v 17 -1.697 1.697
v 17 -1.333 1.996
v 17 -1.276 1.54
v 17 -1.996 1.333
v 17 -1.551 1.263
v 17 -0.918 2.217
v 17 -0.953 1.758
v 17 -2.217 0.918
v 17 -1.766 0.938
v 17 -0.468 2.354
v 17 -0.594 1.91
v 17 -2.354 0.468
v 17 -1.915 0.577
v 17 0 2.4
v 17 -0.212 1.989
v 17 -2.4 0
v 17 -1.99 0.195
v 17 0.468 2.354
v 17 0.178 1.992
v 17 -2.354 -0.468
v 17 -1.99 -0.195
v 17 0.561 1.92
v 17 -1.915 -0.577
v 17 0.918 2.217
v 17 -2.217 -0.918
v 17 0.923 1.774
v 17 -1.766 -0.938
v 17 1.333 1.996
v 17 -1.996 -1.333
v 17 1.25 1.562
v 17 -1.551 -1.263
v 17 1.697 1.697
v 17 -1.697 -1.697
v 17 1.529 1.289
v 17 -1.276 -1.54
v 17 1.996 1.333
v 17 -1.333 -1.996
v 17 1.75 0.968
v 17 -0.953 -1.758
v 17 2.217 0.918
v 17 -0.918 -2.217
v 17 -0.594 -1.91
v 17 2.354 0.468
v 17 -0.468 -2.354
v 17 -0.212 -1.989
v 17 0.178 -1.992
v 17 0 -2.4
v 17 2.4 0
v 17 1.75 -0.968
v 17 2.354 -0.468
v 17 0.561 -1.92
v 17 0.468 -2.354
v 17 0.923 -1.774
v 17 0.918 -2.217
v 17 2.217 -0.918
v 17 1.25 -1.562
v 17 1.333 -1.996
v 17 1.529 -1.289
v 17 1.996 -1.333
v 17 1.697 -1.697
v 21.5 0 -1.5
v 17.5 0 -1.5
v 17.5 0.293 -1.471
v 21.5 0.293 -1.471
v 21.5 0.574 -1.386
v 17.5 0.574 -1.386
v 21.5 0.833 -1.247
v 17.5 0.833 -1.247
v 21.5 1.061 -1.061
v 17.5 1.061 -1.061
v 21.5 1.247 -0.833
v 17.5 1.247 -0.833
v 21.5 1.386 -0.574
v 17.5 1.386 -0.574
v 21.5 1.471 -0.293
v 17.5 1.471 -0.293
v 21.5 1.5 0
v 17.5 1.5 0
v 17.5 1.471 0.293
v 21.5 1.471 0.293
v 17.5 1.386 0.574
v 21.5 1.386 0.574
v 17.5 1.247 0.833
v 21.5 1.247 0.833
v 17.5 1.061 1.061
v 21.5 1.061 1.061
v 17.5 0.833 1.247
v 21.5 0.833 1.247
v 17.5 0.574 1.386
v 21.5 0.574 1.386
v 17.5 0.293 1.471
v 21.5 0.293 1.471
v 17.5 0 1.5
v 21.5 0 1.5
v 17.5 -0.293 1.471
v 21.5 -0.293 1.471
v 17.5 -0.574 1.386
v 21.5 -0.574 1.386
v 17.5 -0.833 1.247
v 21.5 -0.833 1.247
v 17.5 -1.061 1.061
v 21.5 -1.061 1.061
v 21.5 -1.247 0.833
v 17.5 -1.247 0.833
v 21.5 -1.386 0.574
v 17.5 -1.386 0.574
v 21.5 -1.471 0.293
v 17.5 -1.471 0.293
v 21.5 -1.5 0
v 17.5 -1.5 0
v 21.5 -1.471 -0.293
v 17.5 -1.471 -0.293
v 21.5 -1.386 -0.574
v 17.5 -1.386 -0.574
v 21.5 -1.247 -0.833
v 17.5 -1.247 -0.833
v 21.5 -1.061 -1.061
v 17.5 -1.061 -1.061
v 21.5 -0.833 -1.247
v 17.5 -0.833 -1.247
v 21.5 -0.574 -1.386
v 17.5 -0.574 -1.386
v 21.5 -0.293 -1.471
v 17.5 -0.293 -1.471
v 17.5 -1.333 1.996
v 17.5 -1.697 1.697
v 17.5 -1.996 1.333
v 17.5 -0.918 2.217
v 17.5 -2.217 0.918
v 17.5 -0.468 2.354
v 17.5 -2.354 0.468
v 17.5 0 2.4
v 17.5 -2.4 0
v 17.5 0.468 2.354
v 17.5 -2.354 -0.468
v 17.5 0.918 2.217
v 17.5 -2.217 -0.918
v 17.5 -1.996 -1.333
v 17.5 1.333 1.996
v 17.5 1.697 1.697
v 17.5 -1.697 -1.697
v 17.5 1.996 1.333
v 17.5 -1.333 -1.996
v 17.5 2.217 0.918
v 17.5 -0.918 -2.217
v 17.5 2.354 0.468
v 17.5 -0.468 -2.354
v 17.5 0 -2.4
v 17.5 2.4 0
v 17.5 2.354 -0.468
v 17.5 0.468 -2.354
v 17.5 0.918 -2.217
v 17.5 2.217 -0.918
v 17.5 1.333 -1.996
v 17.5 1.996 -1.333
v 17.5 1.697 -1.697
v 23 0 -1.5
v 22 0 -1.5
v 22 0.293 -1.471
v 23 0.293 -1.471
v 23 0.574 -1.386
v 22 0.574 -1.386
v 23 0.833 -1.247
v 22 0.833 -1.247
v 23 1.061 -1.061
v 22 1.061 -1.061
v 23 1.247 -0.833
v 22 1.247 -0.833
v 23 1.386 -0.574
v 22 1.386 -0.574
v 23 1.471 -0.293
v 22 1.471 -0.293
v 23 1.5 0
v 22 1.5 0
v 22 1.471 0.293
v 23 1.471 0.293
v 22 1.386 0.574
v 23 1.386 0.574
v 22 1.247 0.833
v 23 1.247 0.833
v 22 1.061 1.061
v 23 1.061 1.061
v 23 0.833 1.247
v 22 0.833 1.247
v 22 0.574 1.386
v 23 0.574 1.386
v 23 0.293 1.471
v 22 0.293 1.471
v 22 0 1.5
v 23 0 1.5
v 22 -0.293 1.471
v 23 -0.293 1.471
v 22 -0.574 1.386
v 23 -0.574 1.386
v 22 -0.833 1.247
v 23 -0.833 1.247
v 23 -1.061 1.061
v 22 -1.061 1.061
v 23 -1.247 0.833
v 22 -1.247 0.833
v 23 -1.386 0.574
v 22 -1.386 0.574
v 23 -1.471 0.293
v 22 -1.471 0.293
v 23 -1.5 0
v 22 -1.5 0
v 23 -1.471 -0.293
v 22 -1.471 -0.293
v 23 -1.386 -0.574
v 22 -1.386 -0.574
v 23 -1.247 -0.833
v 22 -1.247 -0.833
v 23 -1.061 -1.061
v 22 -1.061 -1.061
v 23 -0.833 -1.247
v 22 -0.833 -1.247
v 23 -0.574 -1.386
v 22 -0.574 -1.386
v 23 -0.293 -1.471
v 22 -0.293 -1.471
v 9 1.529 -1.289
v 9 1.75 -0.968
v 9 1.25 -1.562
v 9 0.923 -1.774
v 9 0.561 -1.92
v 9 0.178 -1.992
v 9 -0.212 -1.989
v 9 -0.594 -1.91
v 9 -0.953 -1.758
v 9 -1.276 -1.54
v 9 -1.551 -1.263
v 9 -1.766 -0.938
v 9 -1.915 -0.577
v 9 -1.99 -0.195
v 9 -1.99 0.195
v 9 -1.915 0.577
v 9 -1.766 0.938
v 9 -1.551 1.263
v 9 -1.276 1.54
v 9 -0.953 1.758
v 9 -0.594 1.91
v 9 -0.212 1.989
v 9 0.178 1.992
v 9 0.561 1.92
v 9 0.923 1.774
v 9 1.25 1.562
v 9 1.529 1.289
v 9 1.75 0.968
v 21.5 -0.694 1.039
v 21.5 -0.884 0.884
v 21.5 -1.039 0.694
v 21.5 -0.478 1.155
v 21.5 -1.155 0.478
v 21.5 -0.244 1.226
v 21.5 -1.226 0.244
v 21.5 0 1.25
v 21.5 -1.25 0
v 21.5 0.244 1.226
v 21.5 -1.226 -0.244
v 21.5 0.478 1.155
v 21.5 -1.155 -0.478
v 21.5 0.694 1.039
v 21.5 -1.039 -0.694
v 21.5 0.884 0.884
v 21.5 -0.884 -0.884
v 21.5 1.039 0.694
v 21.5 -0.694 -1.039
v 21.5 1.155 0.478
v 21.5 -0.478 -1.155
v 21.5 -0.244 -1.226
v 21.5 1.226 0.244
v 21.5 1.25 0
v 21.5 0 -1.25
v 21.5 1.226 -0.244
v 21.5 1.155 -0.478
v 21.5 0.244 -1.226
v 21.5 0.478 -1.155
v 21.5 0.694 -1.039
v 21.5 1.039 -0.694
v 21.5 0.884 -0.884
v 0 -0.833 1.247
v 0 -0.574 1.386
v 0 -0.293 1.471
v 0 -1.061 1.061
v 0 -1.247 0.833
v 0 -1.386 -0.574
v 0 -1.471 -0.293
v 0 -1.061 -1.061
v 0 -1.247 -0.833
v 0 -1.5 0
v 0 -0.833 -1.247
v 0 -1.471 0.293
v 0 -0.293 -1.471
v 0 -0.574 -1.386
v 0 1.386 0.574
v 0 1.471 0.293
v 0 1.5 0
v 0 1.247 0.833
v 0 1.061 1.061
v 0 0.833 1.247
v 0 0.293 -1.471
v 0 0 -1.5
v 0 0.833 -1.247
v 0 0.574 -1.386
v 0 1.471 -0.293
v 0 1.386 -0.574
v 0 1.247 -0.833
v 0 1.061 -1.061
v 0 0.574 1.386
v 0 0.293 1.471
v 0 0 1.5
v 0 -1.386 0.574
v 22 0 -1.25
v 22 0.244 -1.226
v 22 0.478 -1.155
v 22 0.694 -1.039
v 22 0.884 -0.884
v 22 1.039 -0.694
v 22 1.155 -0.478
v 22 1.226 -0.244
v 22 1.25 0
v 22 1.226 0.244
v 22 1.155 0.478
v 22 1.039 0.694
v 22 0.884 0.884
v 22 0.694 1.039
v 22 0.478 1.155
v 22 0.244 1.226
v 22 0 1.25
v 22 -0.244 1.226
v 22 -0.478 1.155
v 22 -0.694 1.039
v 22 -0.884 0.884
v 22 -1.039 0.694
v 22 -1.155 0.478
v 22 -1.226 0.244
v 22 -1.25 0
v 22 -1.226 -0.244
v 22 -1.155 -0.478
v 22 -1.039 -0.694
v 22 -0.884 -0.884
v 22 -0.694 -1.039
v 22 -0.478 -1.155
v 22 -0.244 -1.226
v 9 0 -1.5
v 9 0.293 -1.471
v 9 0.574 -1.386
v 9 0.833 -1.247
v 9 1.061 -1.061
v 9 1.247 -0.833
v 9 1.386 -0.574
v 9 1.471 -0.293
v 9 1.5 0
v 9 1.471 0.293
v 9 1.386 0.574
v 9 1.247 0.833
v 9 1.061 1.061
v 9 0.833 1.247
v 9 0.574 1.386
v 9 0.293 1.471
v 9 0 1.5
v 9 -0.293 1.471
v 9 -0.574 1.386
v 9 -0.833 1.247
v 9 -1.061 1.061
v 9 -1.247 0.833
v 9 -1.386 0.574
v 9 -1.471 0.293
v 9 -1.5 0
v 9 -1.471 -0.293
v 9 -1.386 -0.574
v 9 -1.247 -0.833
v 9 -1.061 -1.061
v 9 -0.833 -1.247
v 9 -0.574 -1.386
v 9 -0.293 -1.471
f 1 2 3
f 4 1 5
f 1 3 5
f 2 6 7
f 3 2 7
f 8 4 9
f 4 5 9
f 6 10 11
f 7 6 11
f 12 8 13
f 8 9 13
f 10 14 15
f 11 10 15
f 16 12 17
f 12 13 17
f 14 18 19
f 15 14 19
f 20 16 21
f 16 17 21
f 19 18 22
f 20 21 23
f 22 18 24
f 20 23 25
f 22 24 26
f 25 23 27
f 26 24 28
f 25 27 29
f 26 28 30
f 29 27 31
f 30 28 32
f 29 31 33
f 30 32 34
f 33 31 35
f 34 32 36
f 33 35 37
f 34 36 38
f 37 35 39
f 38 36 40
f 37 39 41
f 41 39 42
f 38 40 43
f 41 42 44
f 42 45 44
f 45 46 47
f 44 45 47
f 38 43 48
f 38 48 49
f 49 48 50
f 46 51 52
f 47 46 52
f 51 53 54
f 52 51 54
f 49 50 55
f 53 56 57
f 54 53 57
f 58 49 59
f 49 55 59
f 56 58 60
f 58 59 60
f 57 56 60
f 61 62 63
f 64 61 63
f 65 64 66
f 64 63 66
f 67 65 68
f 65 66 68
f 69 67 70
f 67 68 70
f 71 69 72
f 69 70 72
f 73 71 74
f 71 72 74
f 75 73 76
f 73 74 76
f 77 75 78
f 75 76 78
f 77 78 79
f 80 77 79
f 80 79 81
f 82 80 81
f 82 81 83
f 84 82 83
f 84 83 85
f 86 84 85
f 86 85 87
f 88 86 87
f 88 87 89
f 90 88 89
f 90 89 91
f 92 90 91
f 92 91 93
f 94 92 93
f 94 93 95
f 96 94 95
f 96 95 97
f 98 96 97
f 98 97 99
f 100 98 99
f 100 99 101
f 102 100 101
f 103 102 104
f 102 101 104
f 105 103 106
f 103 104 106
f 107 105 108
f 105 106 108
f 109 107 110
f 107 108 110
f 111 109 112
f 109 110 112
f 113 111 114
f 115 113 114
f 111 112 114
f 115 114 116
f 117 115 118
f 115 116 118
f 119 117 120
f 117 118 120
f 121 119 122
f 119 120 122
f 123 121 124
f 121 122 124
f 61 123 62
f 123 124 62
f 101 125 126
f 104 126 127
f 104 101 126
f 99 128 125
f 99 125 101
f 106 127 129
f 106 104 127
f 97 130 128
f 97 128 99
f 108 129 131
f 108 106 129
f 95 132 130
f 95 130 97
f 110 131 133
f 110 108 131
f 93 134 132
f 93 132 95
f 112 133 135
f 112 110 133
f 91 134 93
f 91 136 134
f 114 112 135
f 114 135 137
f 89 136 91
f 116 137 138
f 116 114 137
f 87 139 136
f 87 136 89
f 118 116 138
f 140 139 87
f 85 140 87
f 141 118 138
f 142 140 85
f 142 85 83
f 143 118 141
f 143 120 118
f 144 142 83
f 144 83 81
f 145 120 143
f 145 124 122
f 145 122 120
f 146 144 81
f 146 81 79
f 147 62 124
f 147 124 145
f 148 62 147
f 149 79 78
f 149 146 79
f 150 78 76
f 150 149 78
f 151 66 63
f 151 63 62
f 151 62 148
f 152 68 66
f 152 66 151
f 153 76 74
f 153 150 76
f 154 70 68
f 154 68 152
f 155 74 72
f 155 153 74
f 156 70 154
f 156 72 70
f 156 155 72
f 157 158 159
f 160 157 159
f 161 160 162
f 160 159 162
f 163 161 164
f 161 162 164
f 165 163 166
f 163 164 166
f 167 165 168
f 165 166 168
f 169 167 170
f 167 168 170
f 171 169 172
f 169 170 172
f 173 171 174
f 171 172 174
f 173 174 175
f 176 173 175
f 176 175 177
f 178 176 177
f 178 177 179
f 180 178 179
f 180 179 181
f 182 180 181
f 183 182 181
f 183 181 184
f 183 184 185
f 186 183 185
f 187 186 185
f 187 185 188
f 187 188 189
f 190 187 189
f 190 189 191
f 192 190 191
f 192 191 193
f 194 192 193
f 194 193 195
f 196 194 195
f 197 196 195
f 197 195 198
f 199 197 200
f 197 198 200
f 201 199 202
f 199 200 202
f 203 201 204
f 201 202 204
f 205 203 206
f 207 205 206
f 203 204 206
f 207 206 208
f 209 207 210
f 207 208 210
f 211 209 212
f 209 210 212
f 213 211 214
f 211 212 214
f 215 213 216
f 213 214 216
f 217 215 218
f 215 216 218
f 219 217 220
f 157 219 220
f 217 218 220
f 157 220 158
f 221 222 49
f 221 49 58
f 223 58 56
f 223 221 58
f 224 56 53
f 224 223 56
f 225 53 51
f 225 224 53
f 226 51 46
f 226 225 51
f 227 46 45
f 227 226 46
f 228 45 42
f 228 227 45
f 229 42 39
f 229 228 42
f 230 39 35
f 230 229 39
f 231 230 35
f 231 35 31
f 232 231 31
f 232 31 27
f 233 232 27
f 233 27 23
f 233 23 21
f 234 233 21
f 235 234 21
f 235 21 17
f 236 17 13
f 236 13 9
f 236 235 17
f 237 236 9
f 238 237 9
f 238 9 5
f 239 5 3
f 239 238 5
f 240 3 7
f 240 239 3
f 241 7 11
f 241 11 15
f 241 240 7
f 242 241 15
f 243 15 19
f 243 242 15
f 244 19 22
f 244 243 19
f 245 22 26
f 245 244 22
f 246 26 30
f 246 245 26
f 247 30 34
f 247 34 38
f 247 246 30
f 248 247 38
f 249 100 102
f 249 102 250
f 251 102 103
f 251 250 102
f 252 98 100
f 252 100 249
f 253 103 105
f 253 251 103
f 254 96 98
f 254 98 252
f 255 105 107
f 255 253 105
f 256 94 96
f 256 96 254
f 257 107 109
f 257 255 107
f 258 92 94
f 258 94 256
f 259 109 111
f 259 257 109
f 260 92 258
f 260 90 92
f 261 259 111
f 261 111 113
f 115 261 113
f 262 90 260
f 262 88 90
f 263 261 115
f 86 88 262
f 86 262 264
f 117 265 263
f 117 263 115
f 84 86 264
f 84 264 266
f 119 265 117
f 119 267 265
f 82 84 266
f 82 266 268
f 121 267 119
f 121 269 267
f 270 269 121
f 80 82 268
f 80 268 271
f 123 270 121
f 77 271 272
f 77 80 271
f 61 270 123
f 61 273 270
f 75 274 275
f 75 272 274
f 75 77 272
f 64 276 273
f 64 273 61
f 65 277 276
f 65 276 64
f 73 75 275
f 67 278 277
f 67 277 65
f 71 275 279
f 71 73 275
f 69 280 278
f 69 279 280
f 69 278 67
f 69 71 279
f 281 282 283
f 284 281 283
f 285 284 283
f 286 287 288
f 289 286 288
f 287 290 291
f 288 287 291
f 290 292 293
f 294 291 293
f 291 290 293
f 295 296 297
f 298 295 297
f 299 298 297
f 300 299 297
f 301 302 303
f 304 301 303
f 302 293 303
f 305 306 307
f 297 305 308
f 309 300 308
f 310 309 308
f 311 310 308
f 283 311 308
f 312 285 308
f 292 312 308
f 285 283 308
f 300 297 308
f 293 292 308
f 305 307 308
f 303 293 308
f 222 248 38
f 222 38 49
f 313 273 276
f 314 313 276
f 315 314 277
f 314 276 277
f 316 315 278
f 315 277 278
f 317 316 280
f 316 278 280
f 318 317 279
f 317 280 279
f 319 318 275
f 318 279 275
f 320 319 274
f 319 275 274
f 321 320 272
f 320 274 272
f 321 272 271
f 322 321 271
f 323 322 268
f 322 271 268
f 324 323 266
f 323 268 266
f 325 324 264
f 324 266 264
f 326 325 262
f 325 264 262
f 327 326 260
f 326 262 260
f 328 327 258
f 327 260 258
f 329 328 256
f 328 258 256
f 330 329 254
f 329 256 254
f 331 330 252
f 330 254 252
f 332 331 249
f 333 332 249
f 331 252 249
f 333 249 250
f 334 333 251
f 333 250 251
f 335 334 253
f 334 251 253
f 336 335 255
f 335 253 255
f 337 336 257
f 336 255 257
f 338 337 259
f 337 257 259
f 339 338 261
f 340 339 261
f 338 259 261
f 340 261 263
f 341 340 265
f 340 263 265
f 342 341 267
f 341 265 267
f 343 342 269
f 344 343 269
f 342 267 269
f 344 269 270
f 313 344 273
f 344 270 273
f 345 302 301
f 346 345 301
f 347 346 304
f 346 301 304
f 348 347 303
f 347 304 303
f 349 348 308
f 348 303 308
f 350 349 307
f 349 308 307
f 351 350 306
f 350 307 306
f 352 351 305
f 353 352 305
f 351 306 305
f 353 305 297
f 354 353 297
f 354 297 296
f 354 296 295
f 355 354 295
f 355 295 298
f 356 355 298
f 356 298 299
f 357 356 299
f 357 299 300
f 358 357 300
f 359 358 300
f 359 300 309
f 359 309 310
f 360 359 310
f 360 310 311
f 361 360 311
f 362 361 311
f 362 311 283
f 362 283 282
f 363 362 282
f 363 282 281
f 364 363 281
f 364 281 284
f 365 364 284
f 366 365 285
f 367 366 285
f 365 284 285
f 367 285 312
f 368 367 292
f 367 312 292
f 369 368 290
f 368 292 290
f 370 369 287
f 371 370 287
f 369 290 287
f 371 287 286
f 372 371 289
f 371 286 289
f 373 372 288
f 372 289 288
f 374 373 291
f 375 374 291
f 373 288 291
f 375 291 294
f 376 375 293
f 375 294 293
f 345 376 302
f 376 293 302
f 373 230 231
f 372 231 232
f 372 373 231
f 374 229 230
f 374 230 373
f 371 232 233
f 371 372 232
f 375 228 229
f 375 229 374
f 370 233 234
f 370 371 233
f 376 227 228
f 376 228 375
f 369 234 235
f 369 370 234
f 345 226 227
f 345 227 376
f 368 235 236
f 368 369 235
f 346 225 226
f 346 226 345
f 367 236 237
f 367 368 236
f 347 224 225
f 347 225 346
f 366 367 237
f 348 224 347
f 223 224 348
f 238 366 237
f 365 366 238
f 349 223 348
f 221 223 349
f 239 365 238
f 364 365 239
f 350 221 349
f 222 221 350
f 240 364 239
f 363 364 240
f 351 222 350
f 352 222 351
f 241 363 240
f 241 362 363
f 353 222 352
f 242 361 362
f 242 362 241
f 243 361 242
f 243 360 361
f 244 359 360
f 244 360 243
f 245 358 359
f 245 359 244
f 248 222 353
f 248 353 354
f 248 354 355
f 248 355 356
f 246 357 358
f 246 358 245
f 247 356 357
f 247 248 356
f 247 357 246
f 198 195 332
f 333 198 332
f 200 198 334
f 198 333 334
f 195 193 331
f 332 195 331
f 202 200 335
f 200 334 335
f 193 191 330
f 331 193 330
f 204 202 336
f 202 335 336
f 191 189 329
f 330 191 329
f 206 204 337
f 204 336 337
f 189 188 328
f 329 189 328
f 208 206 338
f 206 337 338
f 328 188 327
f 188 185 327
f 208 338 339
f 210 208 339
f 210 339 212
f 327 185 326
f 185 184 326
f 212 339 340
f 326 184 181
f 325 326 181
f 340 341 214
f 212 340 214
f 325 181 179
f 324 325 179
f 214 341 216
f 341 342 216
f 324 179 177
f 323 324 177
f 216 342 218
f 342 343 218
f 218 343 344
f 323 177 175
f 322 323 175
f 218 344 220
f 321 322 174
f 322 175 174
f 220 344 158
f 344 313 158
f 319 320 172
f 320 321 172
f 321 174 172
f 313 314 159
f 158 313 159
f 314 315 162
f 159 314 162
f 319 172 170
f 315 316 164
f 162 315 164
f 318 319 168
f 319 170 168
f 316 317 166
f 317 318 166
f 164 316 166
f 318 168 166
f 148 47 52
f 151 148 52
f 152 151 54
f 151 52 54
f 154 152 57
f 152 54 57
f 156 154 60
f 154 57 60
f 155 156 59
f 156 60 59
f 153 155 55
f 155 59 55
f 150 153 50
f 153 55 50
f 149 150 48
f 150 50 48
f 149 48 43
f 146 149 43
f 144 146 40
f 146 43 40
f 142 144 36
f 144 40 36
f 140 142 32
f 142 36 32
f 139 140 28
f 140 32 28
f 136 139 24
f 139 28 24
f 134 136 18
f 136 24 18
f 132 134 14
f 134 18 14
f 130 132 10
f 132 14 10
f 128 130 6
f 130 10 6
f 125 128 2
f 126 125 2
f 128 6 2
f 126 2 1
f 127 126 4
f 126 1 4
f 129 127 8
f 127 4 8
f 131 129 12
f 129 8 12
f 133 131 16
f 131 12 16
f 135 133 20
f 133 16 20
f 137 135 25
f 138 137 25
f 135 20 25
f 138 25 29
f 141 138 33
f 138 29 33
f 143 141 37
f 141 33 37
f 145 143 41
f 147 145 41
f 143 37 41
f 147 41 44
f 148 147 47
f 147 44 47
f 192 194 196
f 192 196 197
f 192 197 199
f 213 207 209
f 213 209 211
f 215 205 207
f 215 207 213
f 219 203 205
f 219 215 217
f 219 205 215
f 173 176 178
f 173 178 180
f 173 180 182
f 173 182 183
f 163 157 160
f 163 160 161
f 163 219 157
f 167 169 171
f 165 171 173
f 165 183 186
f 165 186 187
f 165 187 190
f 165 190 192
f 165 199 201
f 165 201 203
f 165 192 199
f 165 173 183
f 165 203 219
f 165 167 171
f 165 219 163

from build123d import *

# Parameters (mm, degrees)
SKETCH_1_R          = 1.5
EXTRUDE_1_DEPTH     = 23
SKETCH_2_R          = 1.5
EXTRUDE_2_DEPTH     = 8
SKETCH_3_R          = 2.4
SKETCH_3_R_2        = 1.5
EXTRUDE_3_DEPTH     = 0.5
CUT_EXTRUDE_START   = -1.5
SKETCH_4_R          = 1.5
SKETCH_4_R_2        = 1.25
CUT_EXTRUDE_1_DEPTH = 0.5


with BuildPart() as part:
    # 草图1 → 凸台-拉伸1 (new body)
    with BuildSketch(Plane(origin=(0, 0, 0), x_dir=(0, 0, -1), z_dir=(1, 0, 0))):
        Circle(SKETCH_1_R)
    extrude(amount=EXTRUDE_1_DEPTH)

    # 草图2 → 凸台-拉伸2 (add)
    with BuildSketch(Plane.ZY.offset(-9)):
        with BuildLine():
            Line((0.968245837, 1.75), (-0.968245837, 1.75))
            ThreePointArc((-0.968245837, 1.75), (0, -2), (0.968245837, 1.75))
        make_face()
        Circle(SKETCH_2_R, mode=Mode.SUBTRACT)
    extrude(amount=-EXTRUDE_2_DEPTH)

    # 草图3 → 凸台-拉伸3 (add)
    with BuildSketch(Plane(origin=(17, 0, 0), x_dir=(0, 0, -1), z_dir=(1, 0, 0))):
        Circle(SKETCH_3_R)
        with Locations(Location((0, 0, 0), (0, 0, 180))):
            Circle(SKETCH_3_R_2, mode=Mode.SUBTRACT)
    extrude(amount=EXTRUDE_3_DEPTH)

    # 草图4 → 切除-拉伸1 (cut)
    with BuildSketch(Plane(origin=(23, 0, 0), x_dir=(0, 0, -1), z_dir=(1, 0, 0)).offset(CUT_EXTRUDE_START)):
        Circle(SKETCH_4_R)
        Circle(SKETCH_4_R_2, mode=Mode.SUBTRACT)
    extrude(amount=CUT_EXTRUDE_1_DEPTH, mode=Mode.SUBTRACT)


solid = part.part
